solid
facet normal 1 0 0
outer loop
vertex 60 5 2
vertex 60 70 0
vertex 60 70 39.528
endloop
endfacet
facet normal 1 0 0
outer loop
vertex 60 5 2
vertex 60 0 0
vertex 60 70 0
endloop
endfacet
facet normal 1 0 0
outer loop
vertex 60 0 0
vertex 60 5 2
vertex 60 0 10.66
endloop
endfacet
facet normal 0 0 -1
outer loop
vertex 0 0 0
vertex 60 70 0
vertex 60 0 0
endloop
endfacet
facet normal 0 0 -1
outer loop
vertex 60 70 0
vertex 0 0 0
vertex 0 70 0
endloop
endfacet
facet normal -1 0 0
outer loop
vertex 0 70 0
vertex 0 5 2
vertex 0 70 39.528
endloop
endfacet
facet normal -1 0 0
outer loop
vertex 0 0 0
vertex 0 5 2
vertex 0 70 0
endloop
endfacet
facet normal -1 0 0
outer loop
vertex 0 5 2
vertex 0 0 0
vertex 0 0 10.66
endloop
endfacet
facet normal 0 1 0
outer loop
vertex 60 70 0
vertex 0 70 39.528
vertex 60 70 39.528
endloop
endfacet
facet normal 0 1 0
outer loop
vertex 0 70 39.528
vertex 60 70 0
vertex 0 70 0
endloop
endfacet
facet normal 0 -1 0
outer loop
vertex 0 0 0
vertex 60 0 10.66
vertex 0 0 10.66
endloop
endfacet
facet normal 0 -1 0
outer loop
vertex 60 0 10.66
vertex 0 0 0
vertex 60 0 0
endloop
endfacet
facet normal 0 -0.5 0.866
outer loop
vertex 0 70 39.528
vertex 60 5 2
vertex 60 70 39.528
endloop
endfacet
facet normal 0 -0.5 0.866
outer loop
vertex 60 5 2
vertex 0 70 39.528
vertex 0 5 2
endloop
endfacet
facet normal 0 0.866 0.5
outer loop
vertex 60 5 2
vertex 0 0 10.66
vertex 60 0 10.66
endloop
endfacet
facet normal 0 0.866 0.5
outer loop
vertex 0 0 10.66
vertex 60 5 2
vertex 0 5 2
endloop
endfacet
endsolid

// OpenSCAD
difference() {
	cube(size=[60, 70, 40], center=false);
	translate([-0.5, 5, 2]) rotate([30, 0, 0]) cube(size=[61, 81, 40], center=false);
}
